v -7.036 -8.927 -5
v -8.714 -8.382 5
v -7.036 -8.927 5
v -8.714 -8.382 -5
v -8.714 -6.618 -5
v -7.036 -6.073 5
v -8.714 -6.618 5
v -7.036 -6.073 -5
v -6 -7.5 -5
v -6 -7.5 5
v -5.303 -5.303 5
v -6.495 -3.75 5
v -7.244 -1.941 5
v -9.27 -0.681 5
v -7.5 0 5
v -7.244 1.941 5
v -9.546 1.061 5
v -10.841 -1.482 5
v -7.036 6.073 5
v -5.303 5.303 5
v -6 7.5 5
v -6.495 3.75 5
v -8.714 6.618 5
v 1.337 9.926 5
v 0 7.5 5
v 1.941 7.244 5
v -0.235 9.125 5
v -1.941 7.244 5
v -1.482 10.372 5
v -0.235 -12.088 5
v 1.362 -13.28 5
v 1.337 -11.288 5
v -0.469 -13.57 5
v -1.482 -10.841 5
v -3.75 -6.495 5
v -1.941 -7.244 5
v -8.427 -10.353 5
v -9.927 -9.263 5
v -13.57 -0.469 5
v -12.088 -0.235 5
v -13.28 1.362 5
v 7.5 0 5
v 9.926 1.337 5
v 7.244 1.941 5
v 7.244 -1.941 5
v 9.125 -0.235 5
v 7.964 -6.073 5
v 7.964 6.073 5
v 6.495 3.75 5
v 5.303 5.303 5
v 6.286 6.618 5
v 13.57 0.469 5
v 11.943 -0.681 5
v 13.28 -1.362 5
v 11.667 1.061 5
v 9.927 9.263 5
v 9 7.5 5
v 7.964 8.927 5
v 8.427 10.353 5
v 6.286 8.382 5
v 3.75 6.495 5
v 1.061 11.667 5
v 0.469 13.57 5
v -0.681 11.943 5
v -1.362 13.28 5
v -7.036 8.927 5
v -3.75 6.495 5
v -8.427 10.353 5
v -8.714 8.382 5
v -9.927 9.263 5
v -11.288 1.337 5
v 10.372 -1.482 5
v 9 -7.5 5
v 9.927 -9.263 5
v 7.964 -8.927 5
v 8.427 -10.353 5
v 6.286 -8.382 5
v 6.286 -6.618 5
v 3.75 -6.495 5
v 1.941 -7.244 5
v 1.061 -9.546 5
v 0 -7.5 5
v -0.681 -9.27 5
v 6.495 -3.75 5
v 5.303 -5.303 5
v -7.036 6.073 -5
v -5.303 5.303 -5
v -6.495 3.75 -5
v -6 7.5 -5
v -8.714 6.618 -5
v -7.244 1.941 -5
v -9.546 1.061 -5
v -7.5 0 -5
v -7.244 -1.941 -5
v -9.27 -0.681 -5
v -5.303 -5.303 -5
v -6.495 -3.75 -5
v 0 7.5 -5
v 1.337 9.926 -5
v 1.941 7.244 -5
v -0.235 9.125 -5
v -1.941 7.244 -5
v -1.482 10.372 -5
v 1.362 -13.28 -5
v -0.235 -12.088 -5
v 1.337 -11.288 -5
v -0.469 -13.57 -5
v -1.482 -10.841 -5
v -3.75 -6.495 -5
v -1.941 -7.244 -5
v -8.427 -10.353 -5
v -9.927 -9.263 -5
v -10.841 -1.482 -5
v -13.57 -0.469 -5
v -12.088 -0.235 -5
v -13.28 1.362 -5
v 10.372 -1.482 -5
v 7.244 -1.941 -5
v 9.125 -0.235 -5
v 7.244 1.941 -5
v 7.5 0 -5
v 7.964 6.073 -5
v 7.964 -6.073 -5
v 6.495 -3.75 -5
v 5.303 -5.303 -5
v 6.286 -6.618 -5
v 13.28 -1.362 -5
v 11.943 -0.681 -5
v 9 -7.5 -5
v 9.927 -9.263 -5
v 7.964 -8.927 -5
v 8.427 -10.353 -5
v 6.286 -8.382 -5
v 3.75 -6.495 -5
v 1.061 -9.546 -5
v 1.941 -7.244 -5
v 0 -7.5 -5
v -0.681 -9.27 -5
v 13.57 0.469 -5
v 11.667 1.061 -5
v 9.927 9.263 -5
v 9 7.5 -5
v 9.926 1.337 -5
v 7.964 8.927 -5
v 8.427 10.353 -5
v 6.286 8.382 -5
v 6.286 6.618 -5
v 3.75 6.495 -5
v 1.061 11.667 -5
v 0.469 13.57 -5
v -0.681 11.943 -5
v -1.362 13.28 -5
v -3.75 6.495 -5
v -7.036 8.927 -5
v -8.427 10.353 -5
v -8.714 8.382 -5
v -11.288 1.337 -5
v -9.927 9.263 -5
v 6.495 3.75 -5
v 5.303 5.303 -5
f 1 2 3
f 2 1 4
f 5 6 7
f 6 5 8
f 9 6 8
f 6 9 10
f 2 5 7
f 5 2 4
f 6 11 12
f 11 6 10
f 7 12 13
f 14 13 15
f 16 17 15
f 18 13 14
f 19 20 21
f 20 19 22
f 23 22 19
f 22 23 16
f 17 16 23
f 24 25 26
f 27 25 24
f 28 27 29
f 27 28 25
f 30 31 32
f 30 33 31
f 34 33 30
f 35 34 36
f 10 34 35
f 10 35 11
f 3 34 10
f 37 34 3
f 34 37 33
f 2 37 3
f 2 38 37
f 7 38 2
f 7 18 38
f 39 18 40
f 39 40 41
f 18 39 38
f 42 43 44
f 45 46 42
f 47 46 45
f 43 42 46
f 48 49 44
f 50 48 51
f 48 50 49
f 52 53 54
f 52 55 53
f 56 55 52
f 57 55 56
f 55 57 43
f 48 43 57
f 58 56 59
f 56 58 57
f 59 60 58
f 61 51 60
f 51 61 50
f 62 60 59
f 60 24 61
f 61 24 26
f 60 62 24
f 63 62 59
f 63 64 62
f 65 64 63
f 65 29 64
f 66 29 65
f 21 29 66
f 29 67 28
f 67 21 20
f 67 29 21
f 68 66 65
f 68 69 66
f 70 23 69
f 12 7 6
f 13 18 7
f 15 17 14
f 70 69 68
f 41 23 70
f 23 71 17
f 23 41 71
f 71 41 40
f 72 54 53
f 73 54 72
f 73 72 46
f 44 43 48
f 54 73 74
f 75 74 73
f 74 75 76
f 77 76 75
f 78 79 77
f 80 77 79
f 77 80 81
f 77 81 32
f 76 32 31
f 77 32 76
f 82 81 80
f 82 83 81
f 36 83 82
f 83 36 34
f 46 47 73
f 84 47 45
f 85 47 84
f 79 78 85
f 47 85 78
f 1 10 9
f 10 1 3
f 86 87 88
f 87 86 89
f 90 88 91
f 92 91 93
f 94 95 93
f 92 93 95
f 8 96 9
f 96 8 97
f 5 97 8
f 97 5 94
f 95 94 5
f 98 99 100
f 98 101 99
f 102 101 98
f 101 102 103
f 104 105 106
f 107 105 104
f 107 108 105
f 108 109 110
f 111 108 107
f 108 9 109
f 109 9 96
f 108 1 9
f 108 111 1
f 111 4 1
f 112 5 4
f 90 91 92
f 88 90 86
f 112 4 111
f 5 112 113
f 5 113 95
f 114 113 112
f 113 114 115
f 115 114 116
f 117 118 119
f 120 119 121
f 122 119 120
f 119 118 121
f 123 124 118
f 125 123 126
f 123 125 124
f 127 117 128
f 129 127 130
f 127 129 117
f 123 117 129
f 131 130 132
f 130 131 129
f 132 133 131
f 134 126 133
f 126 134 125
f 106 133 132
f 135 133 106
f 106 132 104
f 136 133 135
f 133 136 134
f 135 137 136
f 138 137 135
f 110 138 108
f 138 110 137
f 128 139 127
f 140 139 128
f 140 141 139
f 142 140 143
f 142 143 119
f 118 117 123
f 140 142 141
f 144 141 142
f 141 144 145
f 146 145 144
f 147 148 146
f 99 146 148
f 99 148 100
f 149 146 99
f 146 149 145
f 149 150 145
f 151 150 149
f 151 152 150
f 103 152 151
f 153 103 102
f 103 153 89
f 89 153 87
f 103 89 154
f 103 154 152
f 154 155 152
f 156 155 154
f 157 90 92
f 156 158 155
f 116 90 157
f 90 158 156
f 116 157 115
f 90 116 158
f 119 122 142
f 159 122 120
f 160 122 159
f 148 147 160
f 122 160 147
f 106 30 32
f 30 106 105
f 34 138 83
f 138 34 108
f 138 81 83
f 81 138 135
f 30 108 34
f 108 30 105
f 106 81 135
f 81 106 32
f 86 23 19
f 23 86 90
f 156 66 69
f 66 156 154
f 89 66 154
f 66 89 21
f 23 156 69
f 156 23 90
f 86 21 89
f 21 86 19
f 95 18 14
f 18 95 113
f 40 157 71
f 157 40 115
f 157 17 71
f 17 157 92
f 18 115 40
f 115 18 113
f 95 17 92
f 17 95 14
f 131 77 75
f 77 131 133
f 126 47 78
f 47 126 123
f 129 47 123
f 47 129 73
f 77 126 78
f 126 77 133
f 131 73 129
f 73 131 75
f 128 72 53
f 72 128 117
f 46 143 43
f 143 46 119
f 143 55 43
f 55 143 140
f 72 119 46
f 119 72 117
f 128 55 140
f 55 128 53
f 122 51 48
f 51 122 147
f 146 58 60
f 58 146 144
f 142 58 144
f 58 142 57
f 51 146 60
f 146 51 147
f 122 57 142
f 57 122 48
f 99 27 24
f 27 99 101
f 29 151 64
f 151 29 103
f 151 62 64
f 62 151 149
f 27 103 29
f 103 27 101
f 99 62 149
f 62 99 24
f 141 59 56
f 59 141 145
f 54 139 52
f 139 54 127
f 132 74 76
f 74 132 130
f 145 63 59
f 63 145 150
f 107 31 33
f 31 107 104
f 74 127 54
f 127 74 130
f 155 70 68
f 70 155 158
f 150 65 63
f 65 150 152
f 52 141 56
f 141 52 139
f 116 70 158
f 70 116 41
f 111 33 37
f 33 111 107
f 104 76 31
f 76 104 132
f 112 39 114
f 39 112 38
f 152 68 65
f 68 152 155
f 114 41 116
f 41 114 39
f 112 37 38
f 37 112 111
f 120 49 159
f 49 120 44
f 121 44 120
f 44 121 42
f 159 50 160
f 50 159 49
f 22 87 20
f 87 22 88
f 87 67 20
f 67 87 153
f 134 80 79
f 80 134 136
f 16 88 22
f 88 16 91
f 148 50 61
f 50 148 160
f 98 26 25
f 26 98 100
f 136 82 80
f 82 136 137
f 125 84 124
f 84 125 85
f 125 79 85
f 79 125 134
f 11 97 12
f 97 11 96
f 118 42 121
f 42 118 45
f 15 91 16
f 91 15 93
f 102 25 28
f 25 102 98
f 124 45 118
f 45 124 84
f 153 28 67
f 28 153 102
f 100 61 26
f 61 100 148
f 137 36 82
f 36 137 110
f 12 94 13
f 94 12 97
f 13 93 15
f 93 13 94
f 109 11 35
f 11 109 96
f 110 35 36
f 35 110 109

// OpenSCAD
// TODO: Taper bearing holes
module subWheel(outerDiameter, subWheelDiameter, subWheelLength) {
	render()
		rotate_extrude($fn = 25, convexity = 10)
			intersection() {
				translate([(subWheelDiameter/2)-(outerDiameter/2), 0])
					circle(d = outerDiameter, $fn=100);
				translate([0, -subWheelLength/2])
					square([50, subWheelLength]);
			}
}

module subWheelWithBearingMounts(outerDiameter, subWheelDiameter, subWheelLength) {
	bearingDiameter = 10.5;
	bearingThickness = 4;
	axleDiameter = 4;

	taperHeight = (bearingDiameter-axleDiameter)/2;

	render()
		difference() {
			subWheel(outerDiameter = outerDiameter, subWheelDiameter = subWheelDiameter, subWheelLength = subWheelLength);

			// Bearing Hole
			translate([0, 0, subWheelLength/2 - 2])
				cylinder(d = bearingDiameter, h = bearingThickness, center = true);
			translate([0, 0, -(subWheelLength/2 - 2)])
				cylinder(d = bearingDiameter, h = bearingThickness, center = true);

			// Axle Hole
			cylinder(d = axleDiameter, h = subWheelLength, center = true);

			// Taper
			for(flip = [0,1])
				mirror([0, 0, flip])
					translate([0, 0, subWheelLength/2 - taperHeight - bearingThickness])
						cylinder(d1 = axleDiameter, d2 = bearingDiameter, h = taperHeight);
		}
}

module subWheelAssembly(outerDiameter, subWheelDiameter, subWheelLength) {
	for(theta = [0:90:270])
		rotate([0, theta, 0])
			translate([outerDiameter/2 - subWheelDiameter/2, 0])
				subWheel(outerDiameter = outerDiameter, subWheelDiameter = subWheelDiameter, subWheelLength = subWheelLength);
}

module subWheelAssemblyWithBearingMounts(outerDiameter, subWheelDiameter, subWheelLength) {
	for(theta = [0:90:270])
		rotate([0, theta, 0])
			translate([outerDiameter/2 - subWheelDiameter/2, 0])
				subWheelWithBearingMounts(outerDiameter = outerDiameter, subWheelDiameter = subWheelDiameter, subWheelLength = subWheelLength);
}

module wheel(outerDiameter, subWheelDiameter, subWheelLength) {
	
	// Carriage
	width = outerDiameter - 5;
	difference() {
		rotate([90, 0, 0]) {
			intersection() {
				cube([width, width, subWheelDiameter], center = true);
				cylinder(d = outerDiameter - 2, h = subWheelDiameter/2, center = true);
			}
		}

		subWheelAssembly(outerDiameter = outerDiameter, subWheelDiameter = subWheelDiameter + 2, subWheelLength = subWheelLength + 1);

		// Mounting Holes
		rotate([90, 0, 0]) {
			cylinder(d = 15, h = subWheelDiameter, center = true);
			for(x = [-15/2, 15/2])
				for(y = [-15/2, 15/2])
					translate([x, y])
						cylinder(d = 3.5, h = subWheelDiameter, center = true);
		}
		#for(theta = [0:90:270])
			rotate([0, theta, 0])
				translate([outerDiameter/2 - subWheelDiameter/2, 0]) {
					translate([5, 0, 0])
					cube([10, 20, 30 + 1], center = true);
					cylinder(d = 4, h = 42.8, center = true);
					translate([0, 0, 42.8/2 - 1])
						cylinder(d = 6, h = 2.8*2, center = true);
					translate([0, 0, -42.8/2 + 1 - 5])
						cylinder(d = 6.5, h = 2.25*2 + 10, center = true, $fn=6);
				}
	}
}

module wheelAssembly(outerDiameter, subWheelDiameter, subWheelLength) {
	translate([0, -subWheelDiameter/2]) {
		wheel(outerDiameter = outerDiameter, subWheelDiameter = subWheelDiameter, subWheelLength = subWheelLength);
		subWheelAssembly(outerDiameter = outerDiameter, subWheelDiameter = subWheelDiameter, subWheelLength = subWheelLength);
		for(theta = [0:90:270])
			rotate([0, theta, 0])
				translate([outerDiameter/2 - subWheelDiameter/2, 0]) {
					cylinder(d = 3, h = 42.8, center = true);
					translate([0, 0, 42.8/2])
						cylinder(d = 6, h = 2.8*2, center = true);
					translate([0, 0, -42.8/2])
						cylinder(d = 6.5, h = 2.25*2, center = true, $fn=6);
				}
	}
		
	translate([0, subWheelDiameter/2])
		rotate([0, 45, 0]) {
			wheel(outerDiameter = outerDiameter, subWheelDiameter = subWheelDiameter, subWheelLength = subWheelLength);
			subWheelAssembly(outerDiameter = outerDiameter, subWheelDiameter = subWheelDiameter, subWheelLength = subWheelLength);
			for(theta = [0:90:270])
				rotate([0, theta, 0])
					translate([outerDiameter/2 - subWheelDiameter/2, 0]) {
						cylinder(d = 3, h = 42.8, center = true);
						translate([0, 0, 42.8/2 - 2.8/2])
							cylinder(d = 6, h = 2.8, center = true);
						translate([0, 0, -42.8/2 + 2.25/2])
							cylinder(d = 6.5, h = 2.25, center = true, $fn=6);
					}
		}
}

module spacer(subWheelDiameter) {
	difference() {
		hull() {
		for(x = [-15/2, 15/2])
			for(y = [-15/2, 15/2])
				for(theta = [0, 45])
					rotate([0, 0, theta])
						translate([x, y])
							cylinder(d=6, h=subWheelDiameter/2, center=true);
		}
		cylinder(d = 15, h = subWheelDiameter/2, center = true);
		for(x = [-15/2, 15/2])
			for(y = [-15/2, 15/2])
				for(theta = [0, 45])
					rotate([0, 0, theta])
						translate([x, y])
							cylinder(d=3, h=subWheelDiameter/2, center=true);
	}
}

module wheelMount(subWheelDiameter) {
	difference() {
		union() {
			hull() {
				for(x = [-15/2, 15/2])
					for(y = [-15/2, 15/2])
						for(theta = [0])
							rotate([0, 0, theta])
								translate([x, y, -15/2])
									cylinder(d=8, h=15/2);
			}

			cylinder(d = 14, h = 15/2);
		}

		for(x = [-15/2, 15/2])
			for(y = [-15/2, 15/2])
				for(theta = [0])
					rotate([0, 0, theta])
						translate([x, y, -15/2]) {
							cylinder(d=3, h=15/2);
							cylinder(d=7, h=3.5);
						}

		cylinder(d = 5.5, h = 100, center = true);

		translate([0, 0, -15/4])
			rotate([90, 0, 0])
				cylinder(d = 3, h = 30);
	}
}


//wheelAssembly(outerDiameter=50, subWheelDiameter=14, subWheelLength=17.5);
//wheelAssembly(outerDiameter=64, subWheelDiameter=18, subWheelLength=27);

spacer(subWheelDiameter = 20);
//wheelMount();
//wheelAssembly(outerDiameter=70, subWheelDiameter=20, subWheelLength=30);
//wheel(outerDiameter=70, subWheelDiameter=20, subWheelLength=30);
//subWheelAssembly(outerDiameter=70, subWheelDiameter=20, subWheelLength=30);
//subWheelWithBearingMounts(outerDiameter=70, subWheelDiameter=20, subWheelLength=30);

//wheelAssembly(outerDiameter=90, subWheelDiameter=25, subWheelLength=40);
